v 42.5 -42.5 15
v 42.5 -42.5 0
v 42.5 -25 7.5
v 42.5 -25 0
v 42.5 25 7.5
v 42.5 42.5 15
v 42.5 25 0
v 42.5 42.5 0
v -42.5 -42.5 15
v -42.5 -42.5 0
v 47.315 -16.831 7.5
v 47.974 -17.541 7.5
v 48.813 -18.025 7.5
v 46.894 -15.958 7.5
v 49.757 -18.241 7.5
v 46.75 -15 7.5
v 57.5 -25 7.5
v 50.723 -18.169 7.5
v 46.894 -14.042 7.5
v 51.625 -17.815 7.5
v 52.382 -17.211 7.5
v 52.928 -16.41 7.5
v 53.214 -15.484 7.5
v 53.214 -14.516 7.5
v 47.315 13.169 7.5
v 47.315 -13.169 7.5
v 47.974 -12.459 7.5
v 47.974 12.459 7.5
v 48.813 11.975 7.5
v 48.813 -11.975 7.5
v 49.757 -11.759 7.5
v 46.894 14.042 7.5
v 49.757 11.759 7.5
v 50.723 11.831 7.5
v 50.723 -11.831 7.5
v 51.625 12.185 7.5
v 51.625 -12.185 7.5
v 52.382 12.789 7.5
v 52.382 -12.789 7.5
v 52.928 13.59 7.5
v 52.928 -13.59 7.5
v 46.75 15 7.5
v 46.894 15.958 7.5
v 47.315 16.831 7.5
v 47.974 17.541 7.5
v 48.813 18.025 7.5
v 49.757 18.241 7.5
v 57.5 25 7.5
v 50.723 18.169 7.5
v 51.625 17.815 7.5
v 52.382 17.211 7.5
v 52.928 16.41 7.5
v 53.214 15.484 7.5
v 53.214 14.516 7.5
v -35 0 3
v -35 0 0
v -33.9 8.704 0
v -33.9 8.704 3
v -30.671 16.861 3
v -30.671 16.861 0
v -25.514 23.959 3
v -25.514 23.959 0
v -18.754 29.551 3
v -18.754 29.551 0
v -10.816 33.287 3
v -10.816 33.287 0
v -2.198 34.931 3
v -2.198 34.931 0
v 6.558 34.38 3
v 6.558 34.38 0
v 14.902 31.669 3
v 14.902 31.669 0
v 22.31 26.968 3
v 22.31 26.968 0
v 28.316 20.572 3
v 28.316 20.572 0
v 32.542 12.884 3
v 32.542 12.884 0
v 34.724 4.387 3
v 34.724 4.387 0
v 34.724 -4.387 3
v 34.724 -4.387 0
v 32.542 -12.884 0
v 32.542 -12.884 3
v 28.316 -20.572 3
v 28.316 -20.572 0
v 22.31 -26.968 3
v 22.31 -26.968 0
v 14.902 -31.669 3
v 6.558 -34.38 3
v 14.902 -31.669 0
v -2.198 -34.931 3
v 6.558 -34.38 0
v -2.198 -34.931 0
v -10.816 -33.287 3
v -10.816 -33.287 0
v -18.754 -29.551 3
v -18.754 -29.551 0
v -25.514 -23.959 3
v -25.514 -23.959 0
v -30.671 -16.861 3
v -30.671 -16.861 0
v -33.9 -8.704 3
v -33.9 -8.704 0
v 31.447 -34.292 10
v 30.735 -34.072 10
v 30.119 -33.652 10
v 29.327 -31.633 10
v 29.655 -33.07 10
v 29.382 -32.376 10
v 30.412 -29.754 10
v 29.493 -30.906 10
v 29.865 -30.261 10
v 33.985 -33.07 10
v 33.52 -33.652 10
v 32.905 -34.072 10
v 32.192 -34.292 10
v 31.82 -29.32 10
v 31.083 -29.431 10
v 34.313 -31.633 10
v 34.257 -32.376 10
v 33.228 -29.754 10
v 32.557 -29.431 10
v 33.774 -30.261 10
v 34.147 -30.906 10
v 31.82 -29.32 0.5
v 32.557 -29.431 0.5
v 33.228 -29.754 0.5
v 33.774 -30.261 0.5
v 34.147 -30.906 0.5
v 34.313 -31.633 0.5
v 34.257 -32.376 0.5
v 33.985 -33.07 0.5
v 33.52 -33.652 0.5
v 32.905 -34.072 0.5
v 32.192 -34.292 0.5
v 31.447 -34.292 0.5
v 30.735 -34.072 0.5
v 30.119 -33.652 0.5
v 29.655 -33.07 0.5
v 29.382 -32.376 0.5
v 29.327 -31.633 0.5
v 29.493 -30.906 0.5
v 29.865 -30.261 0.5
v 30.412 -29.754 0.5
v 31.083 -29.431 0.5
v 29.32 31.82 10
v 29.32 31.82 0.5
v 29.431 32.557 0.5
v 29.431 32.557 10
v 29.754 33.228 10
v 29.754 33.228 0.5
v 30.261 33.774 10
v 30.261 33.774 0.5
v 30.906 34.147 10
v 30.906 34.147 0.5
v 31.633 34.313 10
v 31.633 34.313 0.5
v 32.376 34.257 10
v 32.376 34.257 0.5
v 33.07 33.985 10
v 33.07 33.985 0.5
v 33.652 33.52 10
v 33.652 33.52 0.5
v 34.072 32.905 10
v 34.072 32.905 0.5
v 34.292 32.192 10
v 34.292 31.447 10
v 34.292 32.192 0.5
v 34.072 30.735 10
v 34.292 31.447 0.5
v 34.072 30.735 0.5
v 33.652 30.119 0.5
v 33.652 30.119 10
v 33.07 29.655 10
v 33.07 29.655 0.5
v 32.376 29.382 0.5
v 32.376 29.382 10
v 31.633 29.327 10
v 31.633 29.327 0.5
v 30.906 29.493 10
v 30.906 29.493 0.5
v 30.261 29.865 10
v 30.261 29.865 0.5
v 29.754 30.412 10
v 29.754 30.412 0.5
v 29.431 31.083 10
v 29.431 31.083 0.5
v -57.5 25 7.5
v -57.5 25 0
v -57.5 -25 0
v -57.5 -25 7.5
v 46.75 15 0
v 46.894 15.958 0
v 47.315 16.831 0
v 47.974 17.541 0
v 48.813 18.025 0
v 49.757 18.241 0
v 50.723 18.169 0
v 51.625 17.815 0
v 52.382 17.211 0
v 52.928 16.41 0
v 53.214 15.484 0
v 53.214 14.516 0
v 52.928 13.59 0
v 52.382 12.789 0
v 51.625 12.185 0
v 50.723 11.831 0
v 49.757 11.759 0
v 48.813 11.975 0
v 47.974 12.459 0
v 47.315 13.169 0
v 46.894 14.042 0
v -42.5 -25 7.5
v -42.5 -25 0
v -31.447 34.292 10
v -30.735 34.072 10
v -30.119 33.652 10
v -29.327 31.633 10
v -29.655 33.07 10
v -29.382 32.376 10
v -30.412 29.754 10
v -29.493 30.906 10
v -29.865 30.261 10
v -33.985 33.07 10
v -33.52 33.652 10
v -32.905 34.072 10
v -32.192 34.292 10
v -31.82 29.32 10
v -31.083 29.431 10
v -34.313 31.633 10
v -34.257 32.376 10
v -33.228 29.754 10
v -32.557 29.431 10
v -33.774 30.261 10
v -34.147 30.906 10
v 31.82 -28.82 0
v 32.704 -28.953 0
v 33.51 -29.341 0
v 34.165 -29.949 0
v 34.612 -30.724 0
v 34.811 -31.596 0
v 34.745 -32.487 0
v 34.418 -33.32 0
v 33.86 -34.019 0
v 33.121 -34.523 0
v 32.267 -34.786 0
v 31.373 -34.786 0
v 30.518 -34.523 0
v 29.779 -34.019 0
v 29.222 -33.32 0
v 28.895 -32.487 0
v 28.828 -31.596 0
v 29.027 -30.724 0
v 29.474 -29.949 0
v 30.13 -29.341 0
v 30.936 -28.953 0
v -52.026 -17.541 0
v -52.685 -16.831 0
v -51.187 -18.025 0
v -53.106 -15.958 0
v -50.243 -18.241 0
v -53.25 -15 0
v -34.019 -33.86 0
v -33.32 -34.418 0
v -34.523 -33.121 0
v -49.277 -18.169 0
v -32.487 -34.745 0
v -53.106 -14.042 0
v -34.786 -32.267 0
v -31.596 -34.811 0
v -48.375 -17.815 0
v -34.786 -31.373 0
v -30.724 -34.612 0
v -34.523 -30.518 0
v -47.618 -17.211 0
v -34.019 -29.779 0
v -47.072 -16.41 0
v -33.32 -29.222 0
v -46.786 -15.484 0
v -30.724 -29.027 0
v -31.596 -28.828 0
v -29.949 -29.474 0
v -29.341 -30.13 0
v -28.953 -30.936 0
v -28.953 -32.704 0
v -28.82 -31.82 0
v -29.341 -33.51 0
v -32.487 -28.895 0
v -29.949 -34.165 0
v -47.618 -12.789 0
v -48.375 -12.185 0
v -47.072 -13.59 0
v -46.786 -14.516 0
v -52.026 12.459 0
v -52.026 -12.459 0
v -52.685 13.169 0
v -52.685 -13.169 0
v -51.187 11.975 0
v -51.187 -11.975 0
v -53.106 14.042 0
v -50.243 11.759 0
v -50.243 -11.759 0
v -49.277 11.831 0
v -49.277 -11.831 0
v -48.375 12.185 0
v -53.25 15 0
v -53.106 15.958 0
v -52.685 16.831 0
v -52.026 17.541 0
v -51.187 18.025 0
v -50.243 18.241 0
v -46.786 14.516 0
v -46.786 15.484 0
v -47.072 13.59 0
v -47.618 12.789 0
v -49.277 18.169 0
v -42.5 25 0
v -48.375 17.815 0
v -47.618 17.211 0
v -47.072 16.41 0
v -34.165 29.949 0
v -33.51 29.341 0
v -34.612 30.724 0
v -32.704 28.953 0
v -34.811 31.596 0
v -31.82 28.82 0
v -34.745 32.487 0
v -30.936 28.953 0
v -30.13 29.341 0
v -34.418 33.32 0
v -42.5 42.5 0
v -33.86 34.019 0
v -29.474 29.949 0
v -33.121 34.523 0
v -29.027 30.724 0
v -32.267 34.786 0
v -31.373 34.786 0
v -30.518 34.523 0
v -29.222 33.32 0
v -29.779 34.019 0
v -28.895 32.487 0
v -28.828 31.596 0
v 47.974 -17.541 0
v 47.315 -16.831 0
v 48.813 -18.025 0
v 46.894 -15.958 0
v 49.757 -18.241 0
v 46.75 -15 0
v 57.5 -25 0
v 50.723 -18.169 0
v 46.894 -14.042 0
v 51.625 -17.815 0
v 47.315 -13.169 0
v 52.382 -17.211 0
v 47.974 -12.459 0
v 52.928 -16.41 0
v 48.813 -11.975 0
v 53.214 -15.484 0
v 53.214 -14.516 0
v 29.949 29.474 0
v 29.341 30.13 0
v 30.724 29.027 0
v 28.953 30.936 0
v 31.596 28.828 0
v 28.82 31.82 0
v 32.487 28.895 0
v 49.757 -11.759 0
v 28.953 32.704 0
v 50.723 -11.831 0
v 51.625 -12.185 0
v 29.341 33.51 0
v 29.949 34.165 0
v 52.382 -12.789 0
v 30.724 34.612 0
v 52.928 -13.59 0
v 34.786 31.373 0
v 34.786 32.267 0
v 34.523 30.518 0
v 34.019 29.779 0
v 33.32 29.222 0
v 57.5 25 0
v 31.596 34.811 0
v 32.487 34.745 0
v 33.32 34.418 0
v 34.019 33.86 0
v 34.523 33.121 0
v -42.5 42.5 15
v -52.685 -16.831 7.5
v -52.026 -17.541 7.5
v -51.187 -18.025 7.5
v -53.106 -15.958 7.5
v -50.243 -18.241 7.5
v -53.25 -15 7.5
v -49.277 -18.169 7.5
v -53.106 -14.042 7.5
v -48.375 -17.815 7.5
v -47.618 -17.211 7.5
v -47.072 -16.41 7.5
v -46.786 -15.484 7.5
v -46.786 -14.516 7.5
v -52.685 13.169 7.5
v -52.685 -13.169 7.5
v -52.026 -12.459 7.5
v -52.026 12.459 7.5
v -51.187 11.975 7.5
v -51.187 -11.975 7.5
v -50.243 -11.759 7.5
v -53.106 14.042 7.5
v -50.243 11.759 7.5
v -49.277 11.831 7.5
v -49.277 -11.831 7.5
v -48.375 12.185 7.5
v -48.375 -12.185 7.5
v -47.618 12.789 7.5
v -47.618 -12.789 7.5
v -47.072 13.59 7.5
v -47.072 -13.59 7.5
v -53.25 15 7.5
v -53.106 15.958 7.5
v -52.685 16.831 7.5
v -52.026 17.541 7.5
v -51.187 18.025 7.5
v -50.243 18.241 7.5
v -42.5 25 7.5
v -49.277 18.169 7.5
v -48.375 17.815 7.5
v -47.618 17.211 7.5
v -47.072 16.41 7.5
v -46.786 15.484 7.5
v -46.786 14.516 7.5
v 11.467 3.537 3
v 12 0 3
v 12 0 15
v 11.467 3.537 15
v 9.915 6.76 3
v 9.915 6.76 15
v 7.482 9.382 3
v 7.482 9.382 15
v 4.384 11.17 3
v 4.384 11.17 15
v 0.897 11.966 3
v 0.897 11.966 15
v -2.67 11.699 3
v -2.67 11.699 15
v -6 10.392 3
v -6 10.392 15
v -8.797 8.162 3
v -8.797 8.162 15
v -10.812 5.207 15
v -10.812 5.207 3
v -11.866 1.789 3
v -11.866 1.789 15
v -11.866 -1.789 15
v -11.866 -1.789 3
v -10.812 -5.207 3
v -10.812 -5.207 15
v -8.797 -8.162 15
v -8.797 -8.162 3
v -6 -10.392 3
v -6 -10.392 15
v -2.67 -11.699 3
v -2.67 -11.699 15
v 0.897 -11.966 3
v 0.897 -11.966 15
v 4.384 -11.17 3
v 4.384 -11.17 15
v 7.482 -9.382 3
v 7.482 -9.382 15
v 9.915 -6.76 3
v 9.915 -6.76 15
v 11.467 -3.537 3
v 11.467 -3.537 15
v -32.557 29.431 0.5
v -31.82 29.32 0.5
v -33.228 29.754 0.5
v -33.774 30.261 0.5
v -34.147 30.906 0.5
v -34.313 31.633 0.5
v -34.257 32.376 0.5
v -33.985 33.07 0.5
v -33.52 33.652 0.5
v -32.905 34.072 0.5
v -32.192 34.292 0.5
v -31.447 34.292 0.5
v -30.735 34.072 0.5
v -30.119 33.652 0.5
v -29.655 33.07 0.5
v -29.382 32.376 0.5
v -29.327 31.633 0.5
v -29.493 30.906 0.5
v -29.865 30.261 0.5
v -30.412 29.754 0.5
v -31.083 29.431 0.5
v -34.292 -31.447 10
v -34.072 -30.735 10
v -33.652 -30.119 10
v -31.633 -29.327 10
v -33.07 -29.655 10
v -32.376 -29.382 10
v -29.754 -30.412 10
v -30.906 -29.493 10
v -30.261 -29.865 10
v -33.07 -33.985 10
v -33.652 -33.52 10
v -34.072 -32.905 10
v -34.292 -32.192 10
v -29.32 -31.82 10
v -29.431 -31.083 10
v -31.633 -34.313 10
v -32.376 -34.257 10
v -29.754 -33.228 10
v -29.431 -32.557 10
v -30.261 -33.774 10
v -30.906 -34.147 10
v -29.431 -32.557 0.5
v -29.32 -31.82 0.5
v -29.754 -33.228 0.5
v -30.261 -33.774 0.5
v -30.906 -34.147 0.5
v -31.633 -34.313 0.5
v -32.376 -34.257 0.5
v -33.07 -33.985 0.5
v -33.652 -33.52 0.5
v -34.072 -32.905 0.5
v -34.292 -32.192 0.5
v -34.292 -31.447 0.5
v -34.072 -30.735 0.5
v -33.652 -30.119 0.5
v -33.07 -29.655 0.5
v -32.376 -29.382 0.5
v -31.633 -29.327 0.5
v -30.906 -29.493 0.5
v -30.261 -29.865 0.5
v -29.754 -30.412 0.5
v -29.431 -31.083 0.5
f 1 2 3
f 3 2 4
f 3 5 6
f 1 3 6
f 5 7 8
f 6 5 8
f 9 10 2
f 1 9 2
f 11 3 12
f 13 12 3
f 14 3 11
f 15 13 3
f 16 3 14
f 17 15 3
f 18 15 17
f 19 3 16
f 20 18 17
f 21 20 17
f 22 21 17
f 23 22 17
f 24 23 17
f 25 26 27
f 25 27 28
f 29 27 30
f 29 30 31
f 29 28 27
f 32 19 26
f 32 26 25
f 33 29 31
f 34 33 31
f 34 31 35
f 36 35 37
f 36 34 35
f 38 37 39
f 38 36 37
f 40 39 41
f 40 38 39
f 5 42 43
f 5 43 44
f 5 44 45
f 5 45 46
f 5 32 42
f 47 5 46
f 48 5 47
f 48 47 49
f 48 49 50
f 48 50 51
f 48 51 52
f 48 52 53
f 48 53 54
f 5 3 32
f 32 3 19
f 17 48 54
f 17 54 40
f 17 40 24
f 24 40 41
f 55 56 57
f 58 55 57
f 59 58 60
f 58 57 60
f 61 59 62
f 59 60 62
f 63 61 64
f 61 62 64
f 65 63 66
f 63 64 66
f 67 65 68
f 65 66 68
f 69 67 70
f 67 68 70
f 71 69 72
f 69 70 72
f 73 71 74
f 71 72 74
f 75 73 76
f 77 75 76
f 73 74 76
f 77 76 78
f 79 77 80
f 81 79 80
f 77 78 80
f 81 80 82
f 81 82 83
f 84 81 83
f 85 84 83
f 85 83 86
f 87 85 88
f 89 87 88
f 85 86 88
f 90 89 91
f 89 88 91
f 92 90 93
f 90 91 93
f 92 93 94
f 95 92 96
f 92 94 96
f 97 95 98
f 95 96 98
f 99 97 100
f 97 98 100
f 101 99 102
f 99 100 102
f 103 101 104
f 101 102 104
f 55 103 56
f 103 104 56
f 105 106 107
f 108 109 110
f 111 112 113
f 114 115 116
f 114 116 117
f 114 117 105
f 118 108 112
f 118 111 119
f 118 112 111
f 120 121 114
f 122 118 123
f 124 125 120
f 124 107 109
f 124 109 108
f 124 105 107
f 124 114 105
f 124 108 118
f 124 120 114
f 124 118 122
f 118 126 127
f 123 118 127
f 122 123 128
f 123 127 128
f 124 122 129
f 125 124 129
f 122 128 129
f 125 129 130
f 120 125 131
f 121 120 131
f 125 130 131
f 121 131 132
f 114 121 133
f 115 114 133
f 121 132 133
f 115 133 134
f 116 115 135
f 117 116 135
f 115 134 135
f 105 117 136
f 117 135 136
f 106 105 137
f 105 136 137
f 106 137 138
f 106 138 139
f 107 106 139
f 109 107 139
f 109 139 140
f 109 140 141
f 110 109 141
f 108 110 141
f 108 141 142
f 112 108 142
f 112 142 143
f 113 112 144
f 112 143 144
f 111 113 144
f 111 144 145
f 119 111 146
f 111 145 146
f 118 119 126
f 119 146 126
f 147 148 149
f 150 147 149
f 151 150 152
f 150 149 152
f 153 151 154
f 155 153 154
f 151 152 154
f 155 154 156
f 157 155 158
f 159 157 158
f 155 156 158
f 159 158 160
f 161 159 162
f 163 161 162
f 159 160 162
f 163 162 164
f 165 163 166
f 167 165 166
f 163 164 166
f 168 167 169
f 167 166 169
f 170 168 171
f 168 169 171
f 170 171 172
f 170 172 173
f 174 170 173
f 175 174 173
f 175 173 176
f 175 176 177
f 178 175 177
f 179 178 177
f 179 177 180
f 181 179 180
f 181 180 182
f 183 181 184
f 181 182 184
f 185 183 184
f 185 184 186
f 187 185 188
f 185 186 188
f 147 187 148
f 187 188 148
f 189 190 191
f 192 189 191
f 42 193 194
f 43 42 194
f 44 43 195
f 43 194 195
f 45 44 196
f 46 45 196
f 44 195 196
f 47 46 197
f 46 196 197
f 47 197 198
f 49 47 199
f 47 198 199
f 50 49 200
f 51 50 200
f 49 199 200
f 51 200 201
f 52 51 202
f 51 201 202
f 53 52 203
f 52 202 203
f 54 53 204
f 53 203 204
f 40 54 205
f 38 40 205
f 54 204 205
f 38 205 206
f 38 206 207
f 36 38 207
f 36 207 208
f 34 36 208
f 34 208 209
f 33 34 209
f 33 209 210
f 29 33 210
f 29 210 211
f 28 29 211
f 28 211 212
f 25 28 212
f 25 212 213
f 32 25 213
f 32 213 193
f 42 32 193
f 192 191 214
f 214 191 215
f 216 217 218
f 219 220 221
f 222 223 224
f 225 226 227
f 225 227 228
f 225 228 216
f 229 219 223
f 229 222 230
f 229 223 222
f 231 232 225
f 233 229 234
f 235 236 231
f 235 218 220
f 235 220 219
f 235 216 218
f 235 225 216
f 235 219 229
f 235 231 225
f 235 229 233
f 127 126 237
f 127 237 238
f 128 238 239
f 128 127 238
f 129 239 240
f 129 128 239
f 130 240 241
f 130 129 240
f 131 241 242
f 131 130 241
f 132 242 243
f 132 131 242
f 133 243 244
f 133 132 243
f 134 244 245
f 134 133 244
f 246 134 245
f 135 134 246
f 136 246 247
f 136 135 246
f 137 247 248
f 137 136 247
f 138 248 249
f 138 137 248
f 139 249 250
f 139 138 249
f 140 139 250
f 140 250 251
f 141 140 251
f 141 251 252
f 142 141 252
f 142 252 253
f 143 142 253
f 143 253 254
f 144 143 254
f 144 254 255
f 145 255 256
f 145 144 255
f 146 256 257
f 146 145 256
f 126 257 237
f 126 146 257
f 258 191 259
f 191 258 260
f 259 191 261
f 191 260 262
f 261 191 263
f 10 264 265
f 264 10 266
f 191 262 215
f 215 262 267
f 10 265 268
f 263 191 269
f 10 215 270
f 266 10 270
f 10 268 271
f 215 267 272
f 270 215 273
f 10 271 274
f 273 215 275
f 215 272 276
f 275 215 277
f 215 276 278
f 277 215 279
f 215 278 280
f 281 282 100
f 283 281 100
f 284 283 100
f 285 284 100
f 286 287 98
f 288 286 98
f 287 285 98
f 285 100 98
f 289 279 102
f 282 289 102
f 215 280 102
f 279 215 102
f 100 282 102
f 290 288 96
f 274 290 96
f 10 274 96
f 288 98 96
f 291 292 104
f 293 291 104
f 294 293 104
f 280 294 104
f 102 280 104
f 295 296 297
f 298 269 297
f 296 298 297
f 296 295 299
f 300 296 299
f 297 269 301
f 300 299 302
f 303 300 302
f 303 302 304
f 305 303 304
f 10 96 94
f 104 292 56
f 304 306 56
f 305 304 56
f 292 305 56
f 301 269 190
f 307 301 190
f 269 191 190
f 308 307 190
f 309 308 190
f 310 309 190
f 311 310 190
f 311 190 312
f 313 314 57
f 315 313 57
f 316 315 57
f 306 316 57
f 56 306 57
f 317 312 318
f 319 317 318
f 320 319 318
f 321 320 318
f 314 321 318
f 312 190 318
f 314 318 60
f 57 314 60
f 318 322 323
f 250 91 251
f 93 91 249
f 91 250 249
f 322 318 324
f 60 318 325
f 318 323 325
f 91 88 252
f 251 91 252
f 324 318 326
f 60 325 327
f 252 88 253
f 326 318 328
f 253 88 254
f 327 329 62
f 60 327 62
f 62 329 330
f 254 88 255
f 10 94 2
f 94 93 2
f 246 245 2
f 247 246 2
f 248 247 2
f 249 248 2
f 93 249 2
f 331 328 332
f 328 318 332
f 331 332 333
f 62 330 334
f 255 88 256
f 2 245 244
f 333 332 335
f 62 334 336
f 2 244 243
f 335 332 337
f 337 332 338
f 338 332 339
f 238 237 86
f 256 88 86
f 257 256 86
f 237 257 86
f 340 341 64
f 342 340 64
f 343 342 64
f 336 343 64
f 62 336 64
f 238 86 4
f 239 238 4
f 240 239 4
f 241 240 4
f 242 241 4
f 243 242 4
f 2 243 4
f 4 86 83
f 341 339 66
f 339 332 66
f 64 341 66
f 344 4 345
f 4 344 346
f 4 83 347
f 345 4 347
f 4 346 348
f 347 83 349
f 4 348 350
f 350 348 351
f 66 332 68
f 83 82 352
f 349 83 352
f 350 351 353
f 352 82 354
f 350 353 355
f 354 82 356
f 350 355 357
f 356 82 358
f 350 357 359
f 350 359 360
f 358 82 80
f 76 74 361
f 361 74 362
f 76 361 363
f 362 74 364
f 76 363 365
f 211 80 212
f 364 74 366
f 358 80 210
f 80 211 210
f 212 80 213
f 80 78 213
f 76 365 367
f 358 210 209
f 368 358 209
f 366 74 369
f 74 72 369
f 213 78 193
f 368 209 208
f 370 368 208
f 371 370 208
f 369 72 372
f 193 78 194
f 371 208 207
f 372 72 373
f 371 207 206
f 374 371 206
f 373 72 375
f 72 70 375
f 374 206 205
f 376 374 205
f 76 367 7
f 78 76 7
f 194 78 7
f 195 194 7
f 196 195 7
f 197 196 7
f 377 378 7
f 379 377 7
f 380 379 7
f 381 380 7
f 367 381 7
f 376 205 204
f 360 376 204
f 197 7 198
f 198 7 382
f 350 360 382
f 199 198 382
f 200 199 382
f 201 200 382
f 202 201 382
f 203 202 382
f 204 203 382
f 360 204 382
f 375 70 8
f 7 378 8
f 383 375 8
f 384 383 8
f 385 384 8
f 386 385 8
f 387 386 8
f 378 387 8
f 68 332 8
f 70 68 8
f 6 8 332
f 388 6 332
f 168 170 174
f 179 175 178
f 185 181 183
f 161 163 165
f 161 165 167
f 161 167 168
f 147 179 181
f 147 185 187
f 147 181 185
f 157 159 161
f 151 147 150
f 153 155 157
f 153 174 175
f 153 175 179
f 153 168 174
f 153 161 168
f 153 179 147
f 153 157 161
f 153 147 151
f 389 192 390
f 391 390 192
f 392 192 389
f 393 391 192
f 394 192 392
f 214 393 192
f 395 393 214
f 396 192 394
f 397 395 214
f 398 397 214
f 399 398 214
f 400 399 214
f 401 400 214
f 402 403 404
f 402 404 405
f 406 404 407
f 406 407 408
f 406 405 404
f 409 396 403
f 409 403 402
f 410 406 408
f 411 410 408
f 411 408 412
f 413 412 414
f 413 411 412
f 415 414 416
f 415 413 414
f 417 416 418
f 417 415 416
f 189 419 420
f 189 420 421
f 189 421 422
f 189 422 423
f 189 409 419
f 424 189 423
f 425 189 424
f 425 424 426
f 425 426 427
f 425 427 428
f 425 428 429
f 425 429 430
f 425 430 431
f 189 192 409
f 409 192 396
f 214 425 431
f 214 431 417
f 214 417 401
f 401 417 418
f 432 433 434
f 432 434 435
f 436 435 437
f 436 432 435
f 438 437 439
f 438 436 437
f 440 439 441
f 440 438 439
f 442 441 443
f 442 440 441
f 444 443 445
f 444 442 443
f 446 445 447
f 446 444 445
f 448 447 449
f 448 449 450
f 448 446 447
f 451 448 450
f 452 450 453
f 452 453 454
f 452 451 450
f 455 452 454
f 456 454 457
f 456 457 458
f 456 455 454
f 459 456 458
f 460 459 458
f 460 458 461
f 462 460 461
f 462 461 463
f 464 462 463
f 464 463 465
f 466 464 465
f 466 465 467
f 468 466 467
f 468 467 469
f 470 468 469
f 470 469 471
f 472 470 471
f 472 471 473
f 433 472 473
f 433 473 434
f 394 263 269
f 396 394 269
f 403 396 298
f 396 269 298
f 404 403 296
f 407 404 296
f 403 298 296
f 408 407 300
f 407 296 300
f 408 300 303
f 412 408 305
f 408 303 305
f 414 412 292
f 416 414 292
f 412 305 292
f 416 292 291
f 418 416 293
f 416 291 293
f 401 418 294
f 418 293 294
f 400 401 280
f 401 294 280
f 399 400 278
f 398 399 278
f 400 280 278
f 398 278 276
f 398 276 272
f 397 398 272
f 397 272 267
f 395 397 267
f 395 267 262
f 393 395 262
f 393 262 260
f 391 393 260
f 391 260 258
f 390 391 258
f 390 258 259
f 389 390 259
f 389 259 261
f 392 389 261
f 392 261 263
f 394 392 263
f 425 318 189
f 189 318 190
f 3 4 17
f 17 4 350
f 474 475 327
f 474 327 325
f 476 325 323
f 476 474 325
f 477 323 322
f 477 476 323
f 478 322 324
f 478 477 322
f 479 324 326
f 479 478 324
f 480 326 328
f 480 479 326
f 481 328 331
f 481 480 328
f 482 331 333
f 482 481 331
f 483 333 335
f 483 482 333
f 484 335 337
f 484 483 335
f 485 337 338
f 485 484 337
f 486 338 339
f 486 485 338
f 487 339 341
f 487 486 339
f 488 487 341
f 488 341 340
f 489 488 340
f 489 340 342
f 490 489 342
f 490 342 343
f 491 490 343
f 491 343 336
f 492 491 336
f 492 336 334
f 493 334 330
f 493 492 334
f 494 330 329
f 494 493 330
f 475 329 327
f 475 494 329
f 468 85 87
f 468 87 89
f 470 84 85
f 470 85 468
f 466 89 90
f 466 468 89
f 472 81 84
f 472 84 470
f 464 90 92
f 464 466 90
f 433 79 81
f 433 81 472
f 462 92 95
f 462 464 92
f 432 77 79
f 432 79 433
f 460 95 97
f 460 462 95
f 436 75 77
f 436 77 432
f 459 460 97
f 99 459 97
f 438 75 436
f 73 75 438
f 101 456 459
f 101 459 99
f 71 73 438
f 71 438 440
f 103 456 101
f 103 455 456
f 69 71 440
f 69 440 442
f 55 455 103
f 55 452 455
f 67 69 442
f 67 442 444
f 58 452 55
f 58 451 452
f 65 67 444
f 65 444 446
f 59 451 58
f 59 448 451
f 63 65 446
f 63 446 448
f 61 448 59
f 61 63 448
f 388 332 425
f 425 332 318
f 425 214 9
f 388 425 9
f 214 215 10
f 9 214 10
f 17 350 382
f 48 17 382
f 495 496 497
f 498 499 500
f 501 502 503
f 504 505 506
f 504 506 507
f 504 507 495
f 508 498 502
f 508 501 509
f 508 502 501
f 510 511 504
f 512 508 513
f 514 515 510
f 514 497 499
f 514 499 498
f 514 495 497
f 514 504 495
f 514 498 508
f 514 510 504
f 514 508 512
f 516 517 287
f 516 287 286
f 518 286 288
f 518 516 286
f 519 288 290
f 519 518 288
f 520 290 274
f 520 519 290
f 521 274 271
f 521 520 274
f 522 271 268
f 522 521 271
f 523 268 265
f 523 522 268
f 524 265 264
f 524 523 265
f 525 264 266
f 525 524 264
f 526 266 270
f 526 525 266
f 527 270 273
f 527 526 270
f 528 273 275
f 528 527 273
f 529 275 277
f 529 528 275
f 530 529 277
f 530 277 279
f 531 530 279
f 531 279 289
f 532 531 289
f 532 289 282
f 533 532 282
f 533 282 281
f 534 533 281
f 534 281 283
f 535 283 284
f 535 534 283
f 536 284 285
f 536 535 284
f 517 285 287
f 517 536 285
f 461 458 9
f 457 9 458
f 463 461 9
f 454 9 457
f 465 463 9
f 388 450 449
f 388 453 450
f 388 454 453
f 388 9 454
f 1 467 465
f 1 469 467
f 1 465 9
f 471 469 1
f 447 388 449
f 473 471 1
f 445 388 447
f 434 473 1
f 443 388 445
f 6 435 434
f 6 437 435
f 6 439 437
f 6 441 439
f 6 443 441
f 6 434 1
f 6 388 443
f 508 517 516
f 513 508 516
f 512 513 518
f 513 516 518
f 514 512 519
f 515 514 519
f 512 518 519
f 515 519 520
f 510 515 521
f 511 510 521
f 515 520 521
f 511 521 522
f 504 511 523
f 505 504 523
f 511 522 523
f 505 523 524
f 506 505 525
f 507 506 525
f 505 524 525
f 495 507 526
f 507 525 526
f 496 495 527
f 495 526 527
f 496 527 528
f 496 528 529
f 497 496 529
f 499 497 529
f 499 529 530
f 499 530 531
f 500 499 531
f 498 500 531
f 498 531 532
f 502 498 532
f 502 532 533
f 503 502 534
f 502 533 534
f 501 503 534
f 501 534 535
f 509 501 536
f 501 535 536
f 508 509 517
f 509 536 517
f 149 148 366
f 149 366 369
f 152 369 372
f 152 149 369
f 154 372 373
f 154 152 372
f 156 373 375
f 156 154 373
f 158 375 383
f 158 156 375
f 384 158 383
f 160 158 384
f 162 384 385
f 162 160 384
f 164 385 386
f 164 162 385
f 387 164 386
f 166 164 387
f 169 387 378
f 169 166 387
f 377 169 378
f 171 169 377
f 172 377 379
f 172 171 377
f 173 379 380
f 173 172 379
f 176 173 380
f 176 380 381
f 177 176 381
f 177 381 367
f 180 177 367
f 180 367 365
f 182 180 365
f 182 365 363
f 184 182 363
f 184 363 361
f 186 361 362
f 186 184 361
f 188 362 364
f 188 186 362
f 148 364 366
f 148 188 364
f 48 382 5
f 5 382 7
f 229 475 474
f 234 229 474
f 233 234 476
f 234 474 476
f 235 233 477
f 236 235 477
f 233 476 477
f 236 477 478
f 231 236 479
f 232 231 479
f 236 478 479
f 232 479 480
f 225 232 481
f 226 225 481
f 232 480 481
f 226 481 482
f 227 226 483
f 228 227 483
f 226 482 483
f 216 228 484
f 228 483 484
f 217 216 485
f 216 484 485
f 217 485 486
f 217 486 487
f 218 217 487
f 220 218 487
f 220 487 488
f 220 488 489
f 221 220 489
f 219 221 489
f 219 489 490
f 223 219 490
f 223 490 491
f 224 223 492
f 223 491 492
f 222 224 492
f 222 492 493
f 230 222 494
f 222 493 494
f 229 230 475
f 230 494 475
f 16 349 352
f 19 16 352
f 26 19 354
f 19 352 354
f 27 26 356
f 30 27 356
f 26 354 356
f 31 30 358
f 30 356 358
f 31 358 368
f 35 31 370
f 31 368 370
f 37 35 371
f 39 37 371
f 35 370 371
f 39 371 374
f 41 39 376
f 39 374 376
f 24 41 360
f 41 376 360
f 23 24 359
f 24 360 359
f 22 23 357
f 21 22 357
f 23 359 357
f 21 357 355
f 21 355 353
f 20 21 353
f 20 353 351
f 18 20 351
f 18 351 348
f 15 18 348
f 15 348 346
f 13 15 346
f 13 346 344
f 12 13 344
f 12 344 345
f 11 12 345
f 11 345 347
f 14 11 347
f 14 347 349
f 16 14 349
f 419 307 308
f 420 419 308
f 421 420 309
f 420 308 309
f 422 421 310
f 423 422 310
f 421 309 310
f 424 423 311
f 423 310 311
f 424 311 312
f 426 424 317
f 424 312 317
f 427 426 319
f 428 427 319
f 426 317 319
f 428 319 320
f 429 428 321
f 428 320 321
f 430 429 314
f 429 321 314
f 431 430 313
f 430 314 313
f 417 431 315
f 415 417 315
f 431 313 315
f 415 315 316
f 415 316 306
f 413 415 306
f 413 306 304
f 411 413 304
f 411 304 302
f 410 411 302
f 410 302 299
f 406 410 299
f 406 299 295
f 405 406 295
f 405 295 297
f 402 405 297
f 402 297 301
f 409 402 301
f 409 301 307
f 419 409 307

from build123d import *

# Parameters (mm, degrees)
SZKIC1_R                    = 12
DODANIE_WYCI_GNI_CIE1_DEPTH = 15
SZKIC6_R                    = 3.25
WYTNIJ_WYCI_GNI_CIE5_DEPTH  = 74.058195981
SZKIC8_W                    = 15
SZKIC8_H                    = 50
WYTNIJ_WYCI_GNI_CIE6_DEPTH  = 7.5
SZKIC9_R                    = 2.5
WYTNIJ_WYCI_GNI_CIE7_DEPTH  = 10
SZYK_KO_OWY1_COUNT          = 4
SFAZOWANIE1_SIZE            = 0.5
SZKIC10_R                   = 35
WYTNIJ_WYCI_GNI_CIE8_DEPTH  = 3


with BuildPart() as part:
    # Szkic1 → Dodanie-wyciągnięcie1 (new body)
    with BuildSketch(Plane.XY):
        Polygon((42.5, 25), (42.5, 42.5), (-42.5, 42.5), (-42.5, 25), (-57.5, 25), (-57.5, -25), (-42.5, -25), (-42.5, -42.5), (42.5, -42.5), (42.5, -25), (57.5, -25), (57.5, 25), align=None)
        Circle(SZKIC1_R, mode=Mode.SUBTRACT)
    extrude(amount=DODANIE_WYCI_GNI_CIE1_DEPTH)

    # Szkic6 → Wytnij-wyciągnięcie5 (cut, through all)
    with BuildSketch(Plane(origin=(0, 0, 0), x_dir=(-1, 0, 0), z_dir=(0, 0, -1))):
        with Locations((-50, -15)):
            Circle(SZKIC6_R)
        with Locations((-50, 15)):
            Circle(SZKIC6_R)
        with Locations((50, 15)):
            Circle(SZKIC6_R)
        with Locations((50, -15)):
            Circle(SZKIC6_R)
    extrude(amount=-WYTNIJ_WYCI_GNI_CIE5_DEPTH, mode=Mode.SUBTRACT)

    # Szkic8 → Wytnij-wyciągnięcie6 (cut)
    with BuildSketch(Plane.XY.offset(15)):
        with Locations((-50, 0)):
            Rectangle(SZKIC8_W, SZKIC8_H)
        with Locations((50, 0)):
            Rectangle(SZKIC8_W, SZKIC8_H)
    extrude(amount=-WYTNIJ_WYCI_GNI_CIE6_DEPTH, mode=Mode.SUBTRACT)

    # Szkic9 → Wytnij-wyciągnięcie7 (cut)
    with BuildSketch(Plane(origin=(0, 0, 0), x_dir=(-1, 0, 0), z_dir=(0, 0, -1))):
        with Locations((-31.819805153, 31.819805153)):
            Circle(SZKIC9_R)
    wytnij_wyci_gni_cie7 = extrude(amount=-WYTNIJ_WYCI_GNI_CIE7_DEPTH, mode=Mode.SUBTRACT)

    # Szyk kołowy1: Wytnij-wyciągnięcie7 ×4 about axis
    szyk_ko_owy1_axis = Axis((0, 0, 15), (0, 0, -1))
    for i in range(1, SZYK_KO_OWY1_COUNT):
        add(wytnij_wyci_gni_cie7.rotate(szyk_ko_owy1_axis, i * 360 / SZYK_KO_OWY1_COUNT), mode=Mode.SUBTRACT)

    # Sfazowanie1
    sfazowanie1_edges = [part.edges().sort_by_distance(p)[0] for p in [
        (34.319805153, 31.819805153, 0),
        (31.819805153, -34.319805153, 0),
        (-34.319805153, -31.819805153, 0),
        (-31.819805153, 34.319805153, 0),
    ]]
    chamfer(sfazowanie1_edges, length=SFAZOWANIE1_SIZE)

    # Szkic10 → Wytnij-wyciągnięcie8 (cut)
    with BuildSketch(Plane(origin=(0, 0, 0), x_dir=(-1, 0, 0), z_dir=(0, 0, -1))):
        Circle(SZKIC10_R)
    extrude(amount=-WYTNIJ_WYCI_GNI_CIE8_DEPTH, mode=Mode.SUBTRACT)


solid = part.part
